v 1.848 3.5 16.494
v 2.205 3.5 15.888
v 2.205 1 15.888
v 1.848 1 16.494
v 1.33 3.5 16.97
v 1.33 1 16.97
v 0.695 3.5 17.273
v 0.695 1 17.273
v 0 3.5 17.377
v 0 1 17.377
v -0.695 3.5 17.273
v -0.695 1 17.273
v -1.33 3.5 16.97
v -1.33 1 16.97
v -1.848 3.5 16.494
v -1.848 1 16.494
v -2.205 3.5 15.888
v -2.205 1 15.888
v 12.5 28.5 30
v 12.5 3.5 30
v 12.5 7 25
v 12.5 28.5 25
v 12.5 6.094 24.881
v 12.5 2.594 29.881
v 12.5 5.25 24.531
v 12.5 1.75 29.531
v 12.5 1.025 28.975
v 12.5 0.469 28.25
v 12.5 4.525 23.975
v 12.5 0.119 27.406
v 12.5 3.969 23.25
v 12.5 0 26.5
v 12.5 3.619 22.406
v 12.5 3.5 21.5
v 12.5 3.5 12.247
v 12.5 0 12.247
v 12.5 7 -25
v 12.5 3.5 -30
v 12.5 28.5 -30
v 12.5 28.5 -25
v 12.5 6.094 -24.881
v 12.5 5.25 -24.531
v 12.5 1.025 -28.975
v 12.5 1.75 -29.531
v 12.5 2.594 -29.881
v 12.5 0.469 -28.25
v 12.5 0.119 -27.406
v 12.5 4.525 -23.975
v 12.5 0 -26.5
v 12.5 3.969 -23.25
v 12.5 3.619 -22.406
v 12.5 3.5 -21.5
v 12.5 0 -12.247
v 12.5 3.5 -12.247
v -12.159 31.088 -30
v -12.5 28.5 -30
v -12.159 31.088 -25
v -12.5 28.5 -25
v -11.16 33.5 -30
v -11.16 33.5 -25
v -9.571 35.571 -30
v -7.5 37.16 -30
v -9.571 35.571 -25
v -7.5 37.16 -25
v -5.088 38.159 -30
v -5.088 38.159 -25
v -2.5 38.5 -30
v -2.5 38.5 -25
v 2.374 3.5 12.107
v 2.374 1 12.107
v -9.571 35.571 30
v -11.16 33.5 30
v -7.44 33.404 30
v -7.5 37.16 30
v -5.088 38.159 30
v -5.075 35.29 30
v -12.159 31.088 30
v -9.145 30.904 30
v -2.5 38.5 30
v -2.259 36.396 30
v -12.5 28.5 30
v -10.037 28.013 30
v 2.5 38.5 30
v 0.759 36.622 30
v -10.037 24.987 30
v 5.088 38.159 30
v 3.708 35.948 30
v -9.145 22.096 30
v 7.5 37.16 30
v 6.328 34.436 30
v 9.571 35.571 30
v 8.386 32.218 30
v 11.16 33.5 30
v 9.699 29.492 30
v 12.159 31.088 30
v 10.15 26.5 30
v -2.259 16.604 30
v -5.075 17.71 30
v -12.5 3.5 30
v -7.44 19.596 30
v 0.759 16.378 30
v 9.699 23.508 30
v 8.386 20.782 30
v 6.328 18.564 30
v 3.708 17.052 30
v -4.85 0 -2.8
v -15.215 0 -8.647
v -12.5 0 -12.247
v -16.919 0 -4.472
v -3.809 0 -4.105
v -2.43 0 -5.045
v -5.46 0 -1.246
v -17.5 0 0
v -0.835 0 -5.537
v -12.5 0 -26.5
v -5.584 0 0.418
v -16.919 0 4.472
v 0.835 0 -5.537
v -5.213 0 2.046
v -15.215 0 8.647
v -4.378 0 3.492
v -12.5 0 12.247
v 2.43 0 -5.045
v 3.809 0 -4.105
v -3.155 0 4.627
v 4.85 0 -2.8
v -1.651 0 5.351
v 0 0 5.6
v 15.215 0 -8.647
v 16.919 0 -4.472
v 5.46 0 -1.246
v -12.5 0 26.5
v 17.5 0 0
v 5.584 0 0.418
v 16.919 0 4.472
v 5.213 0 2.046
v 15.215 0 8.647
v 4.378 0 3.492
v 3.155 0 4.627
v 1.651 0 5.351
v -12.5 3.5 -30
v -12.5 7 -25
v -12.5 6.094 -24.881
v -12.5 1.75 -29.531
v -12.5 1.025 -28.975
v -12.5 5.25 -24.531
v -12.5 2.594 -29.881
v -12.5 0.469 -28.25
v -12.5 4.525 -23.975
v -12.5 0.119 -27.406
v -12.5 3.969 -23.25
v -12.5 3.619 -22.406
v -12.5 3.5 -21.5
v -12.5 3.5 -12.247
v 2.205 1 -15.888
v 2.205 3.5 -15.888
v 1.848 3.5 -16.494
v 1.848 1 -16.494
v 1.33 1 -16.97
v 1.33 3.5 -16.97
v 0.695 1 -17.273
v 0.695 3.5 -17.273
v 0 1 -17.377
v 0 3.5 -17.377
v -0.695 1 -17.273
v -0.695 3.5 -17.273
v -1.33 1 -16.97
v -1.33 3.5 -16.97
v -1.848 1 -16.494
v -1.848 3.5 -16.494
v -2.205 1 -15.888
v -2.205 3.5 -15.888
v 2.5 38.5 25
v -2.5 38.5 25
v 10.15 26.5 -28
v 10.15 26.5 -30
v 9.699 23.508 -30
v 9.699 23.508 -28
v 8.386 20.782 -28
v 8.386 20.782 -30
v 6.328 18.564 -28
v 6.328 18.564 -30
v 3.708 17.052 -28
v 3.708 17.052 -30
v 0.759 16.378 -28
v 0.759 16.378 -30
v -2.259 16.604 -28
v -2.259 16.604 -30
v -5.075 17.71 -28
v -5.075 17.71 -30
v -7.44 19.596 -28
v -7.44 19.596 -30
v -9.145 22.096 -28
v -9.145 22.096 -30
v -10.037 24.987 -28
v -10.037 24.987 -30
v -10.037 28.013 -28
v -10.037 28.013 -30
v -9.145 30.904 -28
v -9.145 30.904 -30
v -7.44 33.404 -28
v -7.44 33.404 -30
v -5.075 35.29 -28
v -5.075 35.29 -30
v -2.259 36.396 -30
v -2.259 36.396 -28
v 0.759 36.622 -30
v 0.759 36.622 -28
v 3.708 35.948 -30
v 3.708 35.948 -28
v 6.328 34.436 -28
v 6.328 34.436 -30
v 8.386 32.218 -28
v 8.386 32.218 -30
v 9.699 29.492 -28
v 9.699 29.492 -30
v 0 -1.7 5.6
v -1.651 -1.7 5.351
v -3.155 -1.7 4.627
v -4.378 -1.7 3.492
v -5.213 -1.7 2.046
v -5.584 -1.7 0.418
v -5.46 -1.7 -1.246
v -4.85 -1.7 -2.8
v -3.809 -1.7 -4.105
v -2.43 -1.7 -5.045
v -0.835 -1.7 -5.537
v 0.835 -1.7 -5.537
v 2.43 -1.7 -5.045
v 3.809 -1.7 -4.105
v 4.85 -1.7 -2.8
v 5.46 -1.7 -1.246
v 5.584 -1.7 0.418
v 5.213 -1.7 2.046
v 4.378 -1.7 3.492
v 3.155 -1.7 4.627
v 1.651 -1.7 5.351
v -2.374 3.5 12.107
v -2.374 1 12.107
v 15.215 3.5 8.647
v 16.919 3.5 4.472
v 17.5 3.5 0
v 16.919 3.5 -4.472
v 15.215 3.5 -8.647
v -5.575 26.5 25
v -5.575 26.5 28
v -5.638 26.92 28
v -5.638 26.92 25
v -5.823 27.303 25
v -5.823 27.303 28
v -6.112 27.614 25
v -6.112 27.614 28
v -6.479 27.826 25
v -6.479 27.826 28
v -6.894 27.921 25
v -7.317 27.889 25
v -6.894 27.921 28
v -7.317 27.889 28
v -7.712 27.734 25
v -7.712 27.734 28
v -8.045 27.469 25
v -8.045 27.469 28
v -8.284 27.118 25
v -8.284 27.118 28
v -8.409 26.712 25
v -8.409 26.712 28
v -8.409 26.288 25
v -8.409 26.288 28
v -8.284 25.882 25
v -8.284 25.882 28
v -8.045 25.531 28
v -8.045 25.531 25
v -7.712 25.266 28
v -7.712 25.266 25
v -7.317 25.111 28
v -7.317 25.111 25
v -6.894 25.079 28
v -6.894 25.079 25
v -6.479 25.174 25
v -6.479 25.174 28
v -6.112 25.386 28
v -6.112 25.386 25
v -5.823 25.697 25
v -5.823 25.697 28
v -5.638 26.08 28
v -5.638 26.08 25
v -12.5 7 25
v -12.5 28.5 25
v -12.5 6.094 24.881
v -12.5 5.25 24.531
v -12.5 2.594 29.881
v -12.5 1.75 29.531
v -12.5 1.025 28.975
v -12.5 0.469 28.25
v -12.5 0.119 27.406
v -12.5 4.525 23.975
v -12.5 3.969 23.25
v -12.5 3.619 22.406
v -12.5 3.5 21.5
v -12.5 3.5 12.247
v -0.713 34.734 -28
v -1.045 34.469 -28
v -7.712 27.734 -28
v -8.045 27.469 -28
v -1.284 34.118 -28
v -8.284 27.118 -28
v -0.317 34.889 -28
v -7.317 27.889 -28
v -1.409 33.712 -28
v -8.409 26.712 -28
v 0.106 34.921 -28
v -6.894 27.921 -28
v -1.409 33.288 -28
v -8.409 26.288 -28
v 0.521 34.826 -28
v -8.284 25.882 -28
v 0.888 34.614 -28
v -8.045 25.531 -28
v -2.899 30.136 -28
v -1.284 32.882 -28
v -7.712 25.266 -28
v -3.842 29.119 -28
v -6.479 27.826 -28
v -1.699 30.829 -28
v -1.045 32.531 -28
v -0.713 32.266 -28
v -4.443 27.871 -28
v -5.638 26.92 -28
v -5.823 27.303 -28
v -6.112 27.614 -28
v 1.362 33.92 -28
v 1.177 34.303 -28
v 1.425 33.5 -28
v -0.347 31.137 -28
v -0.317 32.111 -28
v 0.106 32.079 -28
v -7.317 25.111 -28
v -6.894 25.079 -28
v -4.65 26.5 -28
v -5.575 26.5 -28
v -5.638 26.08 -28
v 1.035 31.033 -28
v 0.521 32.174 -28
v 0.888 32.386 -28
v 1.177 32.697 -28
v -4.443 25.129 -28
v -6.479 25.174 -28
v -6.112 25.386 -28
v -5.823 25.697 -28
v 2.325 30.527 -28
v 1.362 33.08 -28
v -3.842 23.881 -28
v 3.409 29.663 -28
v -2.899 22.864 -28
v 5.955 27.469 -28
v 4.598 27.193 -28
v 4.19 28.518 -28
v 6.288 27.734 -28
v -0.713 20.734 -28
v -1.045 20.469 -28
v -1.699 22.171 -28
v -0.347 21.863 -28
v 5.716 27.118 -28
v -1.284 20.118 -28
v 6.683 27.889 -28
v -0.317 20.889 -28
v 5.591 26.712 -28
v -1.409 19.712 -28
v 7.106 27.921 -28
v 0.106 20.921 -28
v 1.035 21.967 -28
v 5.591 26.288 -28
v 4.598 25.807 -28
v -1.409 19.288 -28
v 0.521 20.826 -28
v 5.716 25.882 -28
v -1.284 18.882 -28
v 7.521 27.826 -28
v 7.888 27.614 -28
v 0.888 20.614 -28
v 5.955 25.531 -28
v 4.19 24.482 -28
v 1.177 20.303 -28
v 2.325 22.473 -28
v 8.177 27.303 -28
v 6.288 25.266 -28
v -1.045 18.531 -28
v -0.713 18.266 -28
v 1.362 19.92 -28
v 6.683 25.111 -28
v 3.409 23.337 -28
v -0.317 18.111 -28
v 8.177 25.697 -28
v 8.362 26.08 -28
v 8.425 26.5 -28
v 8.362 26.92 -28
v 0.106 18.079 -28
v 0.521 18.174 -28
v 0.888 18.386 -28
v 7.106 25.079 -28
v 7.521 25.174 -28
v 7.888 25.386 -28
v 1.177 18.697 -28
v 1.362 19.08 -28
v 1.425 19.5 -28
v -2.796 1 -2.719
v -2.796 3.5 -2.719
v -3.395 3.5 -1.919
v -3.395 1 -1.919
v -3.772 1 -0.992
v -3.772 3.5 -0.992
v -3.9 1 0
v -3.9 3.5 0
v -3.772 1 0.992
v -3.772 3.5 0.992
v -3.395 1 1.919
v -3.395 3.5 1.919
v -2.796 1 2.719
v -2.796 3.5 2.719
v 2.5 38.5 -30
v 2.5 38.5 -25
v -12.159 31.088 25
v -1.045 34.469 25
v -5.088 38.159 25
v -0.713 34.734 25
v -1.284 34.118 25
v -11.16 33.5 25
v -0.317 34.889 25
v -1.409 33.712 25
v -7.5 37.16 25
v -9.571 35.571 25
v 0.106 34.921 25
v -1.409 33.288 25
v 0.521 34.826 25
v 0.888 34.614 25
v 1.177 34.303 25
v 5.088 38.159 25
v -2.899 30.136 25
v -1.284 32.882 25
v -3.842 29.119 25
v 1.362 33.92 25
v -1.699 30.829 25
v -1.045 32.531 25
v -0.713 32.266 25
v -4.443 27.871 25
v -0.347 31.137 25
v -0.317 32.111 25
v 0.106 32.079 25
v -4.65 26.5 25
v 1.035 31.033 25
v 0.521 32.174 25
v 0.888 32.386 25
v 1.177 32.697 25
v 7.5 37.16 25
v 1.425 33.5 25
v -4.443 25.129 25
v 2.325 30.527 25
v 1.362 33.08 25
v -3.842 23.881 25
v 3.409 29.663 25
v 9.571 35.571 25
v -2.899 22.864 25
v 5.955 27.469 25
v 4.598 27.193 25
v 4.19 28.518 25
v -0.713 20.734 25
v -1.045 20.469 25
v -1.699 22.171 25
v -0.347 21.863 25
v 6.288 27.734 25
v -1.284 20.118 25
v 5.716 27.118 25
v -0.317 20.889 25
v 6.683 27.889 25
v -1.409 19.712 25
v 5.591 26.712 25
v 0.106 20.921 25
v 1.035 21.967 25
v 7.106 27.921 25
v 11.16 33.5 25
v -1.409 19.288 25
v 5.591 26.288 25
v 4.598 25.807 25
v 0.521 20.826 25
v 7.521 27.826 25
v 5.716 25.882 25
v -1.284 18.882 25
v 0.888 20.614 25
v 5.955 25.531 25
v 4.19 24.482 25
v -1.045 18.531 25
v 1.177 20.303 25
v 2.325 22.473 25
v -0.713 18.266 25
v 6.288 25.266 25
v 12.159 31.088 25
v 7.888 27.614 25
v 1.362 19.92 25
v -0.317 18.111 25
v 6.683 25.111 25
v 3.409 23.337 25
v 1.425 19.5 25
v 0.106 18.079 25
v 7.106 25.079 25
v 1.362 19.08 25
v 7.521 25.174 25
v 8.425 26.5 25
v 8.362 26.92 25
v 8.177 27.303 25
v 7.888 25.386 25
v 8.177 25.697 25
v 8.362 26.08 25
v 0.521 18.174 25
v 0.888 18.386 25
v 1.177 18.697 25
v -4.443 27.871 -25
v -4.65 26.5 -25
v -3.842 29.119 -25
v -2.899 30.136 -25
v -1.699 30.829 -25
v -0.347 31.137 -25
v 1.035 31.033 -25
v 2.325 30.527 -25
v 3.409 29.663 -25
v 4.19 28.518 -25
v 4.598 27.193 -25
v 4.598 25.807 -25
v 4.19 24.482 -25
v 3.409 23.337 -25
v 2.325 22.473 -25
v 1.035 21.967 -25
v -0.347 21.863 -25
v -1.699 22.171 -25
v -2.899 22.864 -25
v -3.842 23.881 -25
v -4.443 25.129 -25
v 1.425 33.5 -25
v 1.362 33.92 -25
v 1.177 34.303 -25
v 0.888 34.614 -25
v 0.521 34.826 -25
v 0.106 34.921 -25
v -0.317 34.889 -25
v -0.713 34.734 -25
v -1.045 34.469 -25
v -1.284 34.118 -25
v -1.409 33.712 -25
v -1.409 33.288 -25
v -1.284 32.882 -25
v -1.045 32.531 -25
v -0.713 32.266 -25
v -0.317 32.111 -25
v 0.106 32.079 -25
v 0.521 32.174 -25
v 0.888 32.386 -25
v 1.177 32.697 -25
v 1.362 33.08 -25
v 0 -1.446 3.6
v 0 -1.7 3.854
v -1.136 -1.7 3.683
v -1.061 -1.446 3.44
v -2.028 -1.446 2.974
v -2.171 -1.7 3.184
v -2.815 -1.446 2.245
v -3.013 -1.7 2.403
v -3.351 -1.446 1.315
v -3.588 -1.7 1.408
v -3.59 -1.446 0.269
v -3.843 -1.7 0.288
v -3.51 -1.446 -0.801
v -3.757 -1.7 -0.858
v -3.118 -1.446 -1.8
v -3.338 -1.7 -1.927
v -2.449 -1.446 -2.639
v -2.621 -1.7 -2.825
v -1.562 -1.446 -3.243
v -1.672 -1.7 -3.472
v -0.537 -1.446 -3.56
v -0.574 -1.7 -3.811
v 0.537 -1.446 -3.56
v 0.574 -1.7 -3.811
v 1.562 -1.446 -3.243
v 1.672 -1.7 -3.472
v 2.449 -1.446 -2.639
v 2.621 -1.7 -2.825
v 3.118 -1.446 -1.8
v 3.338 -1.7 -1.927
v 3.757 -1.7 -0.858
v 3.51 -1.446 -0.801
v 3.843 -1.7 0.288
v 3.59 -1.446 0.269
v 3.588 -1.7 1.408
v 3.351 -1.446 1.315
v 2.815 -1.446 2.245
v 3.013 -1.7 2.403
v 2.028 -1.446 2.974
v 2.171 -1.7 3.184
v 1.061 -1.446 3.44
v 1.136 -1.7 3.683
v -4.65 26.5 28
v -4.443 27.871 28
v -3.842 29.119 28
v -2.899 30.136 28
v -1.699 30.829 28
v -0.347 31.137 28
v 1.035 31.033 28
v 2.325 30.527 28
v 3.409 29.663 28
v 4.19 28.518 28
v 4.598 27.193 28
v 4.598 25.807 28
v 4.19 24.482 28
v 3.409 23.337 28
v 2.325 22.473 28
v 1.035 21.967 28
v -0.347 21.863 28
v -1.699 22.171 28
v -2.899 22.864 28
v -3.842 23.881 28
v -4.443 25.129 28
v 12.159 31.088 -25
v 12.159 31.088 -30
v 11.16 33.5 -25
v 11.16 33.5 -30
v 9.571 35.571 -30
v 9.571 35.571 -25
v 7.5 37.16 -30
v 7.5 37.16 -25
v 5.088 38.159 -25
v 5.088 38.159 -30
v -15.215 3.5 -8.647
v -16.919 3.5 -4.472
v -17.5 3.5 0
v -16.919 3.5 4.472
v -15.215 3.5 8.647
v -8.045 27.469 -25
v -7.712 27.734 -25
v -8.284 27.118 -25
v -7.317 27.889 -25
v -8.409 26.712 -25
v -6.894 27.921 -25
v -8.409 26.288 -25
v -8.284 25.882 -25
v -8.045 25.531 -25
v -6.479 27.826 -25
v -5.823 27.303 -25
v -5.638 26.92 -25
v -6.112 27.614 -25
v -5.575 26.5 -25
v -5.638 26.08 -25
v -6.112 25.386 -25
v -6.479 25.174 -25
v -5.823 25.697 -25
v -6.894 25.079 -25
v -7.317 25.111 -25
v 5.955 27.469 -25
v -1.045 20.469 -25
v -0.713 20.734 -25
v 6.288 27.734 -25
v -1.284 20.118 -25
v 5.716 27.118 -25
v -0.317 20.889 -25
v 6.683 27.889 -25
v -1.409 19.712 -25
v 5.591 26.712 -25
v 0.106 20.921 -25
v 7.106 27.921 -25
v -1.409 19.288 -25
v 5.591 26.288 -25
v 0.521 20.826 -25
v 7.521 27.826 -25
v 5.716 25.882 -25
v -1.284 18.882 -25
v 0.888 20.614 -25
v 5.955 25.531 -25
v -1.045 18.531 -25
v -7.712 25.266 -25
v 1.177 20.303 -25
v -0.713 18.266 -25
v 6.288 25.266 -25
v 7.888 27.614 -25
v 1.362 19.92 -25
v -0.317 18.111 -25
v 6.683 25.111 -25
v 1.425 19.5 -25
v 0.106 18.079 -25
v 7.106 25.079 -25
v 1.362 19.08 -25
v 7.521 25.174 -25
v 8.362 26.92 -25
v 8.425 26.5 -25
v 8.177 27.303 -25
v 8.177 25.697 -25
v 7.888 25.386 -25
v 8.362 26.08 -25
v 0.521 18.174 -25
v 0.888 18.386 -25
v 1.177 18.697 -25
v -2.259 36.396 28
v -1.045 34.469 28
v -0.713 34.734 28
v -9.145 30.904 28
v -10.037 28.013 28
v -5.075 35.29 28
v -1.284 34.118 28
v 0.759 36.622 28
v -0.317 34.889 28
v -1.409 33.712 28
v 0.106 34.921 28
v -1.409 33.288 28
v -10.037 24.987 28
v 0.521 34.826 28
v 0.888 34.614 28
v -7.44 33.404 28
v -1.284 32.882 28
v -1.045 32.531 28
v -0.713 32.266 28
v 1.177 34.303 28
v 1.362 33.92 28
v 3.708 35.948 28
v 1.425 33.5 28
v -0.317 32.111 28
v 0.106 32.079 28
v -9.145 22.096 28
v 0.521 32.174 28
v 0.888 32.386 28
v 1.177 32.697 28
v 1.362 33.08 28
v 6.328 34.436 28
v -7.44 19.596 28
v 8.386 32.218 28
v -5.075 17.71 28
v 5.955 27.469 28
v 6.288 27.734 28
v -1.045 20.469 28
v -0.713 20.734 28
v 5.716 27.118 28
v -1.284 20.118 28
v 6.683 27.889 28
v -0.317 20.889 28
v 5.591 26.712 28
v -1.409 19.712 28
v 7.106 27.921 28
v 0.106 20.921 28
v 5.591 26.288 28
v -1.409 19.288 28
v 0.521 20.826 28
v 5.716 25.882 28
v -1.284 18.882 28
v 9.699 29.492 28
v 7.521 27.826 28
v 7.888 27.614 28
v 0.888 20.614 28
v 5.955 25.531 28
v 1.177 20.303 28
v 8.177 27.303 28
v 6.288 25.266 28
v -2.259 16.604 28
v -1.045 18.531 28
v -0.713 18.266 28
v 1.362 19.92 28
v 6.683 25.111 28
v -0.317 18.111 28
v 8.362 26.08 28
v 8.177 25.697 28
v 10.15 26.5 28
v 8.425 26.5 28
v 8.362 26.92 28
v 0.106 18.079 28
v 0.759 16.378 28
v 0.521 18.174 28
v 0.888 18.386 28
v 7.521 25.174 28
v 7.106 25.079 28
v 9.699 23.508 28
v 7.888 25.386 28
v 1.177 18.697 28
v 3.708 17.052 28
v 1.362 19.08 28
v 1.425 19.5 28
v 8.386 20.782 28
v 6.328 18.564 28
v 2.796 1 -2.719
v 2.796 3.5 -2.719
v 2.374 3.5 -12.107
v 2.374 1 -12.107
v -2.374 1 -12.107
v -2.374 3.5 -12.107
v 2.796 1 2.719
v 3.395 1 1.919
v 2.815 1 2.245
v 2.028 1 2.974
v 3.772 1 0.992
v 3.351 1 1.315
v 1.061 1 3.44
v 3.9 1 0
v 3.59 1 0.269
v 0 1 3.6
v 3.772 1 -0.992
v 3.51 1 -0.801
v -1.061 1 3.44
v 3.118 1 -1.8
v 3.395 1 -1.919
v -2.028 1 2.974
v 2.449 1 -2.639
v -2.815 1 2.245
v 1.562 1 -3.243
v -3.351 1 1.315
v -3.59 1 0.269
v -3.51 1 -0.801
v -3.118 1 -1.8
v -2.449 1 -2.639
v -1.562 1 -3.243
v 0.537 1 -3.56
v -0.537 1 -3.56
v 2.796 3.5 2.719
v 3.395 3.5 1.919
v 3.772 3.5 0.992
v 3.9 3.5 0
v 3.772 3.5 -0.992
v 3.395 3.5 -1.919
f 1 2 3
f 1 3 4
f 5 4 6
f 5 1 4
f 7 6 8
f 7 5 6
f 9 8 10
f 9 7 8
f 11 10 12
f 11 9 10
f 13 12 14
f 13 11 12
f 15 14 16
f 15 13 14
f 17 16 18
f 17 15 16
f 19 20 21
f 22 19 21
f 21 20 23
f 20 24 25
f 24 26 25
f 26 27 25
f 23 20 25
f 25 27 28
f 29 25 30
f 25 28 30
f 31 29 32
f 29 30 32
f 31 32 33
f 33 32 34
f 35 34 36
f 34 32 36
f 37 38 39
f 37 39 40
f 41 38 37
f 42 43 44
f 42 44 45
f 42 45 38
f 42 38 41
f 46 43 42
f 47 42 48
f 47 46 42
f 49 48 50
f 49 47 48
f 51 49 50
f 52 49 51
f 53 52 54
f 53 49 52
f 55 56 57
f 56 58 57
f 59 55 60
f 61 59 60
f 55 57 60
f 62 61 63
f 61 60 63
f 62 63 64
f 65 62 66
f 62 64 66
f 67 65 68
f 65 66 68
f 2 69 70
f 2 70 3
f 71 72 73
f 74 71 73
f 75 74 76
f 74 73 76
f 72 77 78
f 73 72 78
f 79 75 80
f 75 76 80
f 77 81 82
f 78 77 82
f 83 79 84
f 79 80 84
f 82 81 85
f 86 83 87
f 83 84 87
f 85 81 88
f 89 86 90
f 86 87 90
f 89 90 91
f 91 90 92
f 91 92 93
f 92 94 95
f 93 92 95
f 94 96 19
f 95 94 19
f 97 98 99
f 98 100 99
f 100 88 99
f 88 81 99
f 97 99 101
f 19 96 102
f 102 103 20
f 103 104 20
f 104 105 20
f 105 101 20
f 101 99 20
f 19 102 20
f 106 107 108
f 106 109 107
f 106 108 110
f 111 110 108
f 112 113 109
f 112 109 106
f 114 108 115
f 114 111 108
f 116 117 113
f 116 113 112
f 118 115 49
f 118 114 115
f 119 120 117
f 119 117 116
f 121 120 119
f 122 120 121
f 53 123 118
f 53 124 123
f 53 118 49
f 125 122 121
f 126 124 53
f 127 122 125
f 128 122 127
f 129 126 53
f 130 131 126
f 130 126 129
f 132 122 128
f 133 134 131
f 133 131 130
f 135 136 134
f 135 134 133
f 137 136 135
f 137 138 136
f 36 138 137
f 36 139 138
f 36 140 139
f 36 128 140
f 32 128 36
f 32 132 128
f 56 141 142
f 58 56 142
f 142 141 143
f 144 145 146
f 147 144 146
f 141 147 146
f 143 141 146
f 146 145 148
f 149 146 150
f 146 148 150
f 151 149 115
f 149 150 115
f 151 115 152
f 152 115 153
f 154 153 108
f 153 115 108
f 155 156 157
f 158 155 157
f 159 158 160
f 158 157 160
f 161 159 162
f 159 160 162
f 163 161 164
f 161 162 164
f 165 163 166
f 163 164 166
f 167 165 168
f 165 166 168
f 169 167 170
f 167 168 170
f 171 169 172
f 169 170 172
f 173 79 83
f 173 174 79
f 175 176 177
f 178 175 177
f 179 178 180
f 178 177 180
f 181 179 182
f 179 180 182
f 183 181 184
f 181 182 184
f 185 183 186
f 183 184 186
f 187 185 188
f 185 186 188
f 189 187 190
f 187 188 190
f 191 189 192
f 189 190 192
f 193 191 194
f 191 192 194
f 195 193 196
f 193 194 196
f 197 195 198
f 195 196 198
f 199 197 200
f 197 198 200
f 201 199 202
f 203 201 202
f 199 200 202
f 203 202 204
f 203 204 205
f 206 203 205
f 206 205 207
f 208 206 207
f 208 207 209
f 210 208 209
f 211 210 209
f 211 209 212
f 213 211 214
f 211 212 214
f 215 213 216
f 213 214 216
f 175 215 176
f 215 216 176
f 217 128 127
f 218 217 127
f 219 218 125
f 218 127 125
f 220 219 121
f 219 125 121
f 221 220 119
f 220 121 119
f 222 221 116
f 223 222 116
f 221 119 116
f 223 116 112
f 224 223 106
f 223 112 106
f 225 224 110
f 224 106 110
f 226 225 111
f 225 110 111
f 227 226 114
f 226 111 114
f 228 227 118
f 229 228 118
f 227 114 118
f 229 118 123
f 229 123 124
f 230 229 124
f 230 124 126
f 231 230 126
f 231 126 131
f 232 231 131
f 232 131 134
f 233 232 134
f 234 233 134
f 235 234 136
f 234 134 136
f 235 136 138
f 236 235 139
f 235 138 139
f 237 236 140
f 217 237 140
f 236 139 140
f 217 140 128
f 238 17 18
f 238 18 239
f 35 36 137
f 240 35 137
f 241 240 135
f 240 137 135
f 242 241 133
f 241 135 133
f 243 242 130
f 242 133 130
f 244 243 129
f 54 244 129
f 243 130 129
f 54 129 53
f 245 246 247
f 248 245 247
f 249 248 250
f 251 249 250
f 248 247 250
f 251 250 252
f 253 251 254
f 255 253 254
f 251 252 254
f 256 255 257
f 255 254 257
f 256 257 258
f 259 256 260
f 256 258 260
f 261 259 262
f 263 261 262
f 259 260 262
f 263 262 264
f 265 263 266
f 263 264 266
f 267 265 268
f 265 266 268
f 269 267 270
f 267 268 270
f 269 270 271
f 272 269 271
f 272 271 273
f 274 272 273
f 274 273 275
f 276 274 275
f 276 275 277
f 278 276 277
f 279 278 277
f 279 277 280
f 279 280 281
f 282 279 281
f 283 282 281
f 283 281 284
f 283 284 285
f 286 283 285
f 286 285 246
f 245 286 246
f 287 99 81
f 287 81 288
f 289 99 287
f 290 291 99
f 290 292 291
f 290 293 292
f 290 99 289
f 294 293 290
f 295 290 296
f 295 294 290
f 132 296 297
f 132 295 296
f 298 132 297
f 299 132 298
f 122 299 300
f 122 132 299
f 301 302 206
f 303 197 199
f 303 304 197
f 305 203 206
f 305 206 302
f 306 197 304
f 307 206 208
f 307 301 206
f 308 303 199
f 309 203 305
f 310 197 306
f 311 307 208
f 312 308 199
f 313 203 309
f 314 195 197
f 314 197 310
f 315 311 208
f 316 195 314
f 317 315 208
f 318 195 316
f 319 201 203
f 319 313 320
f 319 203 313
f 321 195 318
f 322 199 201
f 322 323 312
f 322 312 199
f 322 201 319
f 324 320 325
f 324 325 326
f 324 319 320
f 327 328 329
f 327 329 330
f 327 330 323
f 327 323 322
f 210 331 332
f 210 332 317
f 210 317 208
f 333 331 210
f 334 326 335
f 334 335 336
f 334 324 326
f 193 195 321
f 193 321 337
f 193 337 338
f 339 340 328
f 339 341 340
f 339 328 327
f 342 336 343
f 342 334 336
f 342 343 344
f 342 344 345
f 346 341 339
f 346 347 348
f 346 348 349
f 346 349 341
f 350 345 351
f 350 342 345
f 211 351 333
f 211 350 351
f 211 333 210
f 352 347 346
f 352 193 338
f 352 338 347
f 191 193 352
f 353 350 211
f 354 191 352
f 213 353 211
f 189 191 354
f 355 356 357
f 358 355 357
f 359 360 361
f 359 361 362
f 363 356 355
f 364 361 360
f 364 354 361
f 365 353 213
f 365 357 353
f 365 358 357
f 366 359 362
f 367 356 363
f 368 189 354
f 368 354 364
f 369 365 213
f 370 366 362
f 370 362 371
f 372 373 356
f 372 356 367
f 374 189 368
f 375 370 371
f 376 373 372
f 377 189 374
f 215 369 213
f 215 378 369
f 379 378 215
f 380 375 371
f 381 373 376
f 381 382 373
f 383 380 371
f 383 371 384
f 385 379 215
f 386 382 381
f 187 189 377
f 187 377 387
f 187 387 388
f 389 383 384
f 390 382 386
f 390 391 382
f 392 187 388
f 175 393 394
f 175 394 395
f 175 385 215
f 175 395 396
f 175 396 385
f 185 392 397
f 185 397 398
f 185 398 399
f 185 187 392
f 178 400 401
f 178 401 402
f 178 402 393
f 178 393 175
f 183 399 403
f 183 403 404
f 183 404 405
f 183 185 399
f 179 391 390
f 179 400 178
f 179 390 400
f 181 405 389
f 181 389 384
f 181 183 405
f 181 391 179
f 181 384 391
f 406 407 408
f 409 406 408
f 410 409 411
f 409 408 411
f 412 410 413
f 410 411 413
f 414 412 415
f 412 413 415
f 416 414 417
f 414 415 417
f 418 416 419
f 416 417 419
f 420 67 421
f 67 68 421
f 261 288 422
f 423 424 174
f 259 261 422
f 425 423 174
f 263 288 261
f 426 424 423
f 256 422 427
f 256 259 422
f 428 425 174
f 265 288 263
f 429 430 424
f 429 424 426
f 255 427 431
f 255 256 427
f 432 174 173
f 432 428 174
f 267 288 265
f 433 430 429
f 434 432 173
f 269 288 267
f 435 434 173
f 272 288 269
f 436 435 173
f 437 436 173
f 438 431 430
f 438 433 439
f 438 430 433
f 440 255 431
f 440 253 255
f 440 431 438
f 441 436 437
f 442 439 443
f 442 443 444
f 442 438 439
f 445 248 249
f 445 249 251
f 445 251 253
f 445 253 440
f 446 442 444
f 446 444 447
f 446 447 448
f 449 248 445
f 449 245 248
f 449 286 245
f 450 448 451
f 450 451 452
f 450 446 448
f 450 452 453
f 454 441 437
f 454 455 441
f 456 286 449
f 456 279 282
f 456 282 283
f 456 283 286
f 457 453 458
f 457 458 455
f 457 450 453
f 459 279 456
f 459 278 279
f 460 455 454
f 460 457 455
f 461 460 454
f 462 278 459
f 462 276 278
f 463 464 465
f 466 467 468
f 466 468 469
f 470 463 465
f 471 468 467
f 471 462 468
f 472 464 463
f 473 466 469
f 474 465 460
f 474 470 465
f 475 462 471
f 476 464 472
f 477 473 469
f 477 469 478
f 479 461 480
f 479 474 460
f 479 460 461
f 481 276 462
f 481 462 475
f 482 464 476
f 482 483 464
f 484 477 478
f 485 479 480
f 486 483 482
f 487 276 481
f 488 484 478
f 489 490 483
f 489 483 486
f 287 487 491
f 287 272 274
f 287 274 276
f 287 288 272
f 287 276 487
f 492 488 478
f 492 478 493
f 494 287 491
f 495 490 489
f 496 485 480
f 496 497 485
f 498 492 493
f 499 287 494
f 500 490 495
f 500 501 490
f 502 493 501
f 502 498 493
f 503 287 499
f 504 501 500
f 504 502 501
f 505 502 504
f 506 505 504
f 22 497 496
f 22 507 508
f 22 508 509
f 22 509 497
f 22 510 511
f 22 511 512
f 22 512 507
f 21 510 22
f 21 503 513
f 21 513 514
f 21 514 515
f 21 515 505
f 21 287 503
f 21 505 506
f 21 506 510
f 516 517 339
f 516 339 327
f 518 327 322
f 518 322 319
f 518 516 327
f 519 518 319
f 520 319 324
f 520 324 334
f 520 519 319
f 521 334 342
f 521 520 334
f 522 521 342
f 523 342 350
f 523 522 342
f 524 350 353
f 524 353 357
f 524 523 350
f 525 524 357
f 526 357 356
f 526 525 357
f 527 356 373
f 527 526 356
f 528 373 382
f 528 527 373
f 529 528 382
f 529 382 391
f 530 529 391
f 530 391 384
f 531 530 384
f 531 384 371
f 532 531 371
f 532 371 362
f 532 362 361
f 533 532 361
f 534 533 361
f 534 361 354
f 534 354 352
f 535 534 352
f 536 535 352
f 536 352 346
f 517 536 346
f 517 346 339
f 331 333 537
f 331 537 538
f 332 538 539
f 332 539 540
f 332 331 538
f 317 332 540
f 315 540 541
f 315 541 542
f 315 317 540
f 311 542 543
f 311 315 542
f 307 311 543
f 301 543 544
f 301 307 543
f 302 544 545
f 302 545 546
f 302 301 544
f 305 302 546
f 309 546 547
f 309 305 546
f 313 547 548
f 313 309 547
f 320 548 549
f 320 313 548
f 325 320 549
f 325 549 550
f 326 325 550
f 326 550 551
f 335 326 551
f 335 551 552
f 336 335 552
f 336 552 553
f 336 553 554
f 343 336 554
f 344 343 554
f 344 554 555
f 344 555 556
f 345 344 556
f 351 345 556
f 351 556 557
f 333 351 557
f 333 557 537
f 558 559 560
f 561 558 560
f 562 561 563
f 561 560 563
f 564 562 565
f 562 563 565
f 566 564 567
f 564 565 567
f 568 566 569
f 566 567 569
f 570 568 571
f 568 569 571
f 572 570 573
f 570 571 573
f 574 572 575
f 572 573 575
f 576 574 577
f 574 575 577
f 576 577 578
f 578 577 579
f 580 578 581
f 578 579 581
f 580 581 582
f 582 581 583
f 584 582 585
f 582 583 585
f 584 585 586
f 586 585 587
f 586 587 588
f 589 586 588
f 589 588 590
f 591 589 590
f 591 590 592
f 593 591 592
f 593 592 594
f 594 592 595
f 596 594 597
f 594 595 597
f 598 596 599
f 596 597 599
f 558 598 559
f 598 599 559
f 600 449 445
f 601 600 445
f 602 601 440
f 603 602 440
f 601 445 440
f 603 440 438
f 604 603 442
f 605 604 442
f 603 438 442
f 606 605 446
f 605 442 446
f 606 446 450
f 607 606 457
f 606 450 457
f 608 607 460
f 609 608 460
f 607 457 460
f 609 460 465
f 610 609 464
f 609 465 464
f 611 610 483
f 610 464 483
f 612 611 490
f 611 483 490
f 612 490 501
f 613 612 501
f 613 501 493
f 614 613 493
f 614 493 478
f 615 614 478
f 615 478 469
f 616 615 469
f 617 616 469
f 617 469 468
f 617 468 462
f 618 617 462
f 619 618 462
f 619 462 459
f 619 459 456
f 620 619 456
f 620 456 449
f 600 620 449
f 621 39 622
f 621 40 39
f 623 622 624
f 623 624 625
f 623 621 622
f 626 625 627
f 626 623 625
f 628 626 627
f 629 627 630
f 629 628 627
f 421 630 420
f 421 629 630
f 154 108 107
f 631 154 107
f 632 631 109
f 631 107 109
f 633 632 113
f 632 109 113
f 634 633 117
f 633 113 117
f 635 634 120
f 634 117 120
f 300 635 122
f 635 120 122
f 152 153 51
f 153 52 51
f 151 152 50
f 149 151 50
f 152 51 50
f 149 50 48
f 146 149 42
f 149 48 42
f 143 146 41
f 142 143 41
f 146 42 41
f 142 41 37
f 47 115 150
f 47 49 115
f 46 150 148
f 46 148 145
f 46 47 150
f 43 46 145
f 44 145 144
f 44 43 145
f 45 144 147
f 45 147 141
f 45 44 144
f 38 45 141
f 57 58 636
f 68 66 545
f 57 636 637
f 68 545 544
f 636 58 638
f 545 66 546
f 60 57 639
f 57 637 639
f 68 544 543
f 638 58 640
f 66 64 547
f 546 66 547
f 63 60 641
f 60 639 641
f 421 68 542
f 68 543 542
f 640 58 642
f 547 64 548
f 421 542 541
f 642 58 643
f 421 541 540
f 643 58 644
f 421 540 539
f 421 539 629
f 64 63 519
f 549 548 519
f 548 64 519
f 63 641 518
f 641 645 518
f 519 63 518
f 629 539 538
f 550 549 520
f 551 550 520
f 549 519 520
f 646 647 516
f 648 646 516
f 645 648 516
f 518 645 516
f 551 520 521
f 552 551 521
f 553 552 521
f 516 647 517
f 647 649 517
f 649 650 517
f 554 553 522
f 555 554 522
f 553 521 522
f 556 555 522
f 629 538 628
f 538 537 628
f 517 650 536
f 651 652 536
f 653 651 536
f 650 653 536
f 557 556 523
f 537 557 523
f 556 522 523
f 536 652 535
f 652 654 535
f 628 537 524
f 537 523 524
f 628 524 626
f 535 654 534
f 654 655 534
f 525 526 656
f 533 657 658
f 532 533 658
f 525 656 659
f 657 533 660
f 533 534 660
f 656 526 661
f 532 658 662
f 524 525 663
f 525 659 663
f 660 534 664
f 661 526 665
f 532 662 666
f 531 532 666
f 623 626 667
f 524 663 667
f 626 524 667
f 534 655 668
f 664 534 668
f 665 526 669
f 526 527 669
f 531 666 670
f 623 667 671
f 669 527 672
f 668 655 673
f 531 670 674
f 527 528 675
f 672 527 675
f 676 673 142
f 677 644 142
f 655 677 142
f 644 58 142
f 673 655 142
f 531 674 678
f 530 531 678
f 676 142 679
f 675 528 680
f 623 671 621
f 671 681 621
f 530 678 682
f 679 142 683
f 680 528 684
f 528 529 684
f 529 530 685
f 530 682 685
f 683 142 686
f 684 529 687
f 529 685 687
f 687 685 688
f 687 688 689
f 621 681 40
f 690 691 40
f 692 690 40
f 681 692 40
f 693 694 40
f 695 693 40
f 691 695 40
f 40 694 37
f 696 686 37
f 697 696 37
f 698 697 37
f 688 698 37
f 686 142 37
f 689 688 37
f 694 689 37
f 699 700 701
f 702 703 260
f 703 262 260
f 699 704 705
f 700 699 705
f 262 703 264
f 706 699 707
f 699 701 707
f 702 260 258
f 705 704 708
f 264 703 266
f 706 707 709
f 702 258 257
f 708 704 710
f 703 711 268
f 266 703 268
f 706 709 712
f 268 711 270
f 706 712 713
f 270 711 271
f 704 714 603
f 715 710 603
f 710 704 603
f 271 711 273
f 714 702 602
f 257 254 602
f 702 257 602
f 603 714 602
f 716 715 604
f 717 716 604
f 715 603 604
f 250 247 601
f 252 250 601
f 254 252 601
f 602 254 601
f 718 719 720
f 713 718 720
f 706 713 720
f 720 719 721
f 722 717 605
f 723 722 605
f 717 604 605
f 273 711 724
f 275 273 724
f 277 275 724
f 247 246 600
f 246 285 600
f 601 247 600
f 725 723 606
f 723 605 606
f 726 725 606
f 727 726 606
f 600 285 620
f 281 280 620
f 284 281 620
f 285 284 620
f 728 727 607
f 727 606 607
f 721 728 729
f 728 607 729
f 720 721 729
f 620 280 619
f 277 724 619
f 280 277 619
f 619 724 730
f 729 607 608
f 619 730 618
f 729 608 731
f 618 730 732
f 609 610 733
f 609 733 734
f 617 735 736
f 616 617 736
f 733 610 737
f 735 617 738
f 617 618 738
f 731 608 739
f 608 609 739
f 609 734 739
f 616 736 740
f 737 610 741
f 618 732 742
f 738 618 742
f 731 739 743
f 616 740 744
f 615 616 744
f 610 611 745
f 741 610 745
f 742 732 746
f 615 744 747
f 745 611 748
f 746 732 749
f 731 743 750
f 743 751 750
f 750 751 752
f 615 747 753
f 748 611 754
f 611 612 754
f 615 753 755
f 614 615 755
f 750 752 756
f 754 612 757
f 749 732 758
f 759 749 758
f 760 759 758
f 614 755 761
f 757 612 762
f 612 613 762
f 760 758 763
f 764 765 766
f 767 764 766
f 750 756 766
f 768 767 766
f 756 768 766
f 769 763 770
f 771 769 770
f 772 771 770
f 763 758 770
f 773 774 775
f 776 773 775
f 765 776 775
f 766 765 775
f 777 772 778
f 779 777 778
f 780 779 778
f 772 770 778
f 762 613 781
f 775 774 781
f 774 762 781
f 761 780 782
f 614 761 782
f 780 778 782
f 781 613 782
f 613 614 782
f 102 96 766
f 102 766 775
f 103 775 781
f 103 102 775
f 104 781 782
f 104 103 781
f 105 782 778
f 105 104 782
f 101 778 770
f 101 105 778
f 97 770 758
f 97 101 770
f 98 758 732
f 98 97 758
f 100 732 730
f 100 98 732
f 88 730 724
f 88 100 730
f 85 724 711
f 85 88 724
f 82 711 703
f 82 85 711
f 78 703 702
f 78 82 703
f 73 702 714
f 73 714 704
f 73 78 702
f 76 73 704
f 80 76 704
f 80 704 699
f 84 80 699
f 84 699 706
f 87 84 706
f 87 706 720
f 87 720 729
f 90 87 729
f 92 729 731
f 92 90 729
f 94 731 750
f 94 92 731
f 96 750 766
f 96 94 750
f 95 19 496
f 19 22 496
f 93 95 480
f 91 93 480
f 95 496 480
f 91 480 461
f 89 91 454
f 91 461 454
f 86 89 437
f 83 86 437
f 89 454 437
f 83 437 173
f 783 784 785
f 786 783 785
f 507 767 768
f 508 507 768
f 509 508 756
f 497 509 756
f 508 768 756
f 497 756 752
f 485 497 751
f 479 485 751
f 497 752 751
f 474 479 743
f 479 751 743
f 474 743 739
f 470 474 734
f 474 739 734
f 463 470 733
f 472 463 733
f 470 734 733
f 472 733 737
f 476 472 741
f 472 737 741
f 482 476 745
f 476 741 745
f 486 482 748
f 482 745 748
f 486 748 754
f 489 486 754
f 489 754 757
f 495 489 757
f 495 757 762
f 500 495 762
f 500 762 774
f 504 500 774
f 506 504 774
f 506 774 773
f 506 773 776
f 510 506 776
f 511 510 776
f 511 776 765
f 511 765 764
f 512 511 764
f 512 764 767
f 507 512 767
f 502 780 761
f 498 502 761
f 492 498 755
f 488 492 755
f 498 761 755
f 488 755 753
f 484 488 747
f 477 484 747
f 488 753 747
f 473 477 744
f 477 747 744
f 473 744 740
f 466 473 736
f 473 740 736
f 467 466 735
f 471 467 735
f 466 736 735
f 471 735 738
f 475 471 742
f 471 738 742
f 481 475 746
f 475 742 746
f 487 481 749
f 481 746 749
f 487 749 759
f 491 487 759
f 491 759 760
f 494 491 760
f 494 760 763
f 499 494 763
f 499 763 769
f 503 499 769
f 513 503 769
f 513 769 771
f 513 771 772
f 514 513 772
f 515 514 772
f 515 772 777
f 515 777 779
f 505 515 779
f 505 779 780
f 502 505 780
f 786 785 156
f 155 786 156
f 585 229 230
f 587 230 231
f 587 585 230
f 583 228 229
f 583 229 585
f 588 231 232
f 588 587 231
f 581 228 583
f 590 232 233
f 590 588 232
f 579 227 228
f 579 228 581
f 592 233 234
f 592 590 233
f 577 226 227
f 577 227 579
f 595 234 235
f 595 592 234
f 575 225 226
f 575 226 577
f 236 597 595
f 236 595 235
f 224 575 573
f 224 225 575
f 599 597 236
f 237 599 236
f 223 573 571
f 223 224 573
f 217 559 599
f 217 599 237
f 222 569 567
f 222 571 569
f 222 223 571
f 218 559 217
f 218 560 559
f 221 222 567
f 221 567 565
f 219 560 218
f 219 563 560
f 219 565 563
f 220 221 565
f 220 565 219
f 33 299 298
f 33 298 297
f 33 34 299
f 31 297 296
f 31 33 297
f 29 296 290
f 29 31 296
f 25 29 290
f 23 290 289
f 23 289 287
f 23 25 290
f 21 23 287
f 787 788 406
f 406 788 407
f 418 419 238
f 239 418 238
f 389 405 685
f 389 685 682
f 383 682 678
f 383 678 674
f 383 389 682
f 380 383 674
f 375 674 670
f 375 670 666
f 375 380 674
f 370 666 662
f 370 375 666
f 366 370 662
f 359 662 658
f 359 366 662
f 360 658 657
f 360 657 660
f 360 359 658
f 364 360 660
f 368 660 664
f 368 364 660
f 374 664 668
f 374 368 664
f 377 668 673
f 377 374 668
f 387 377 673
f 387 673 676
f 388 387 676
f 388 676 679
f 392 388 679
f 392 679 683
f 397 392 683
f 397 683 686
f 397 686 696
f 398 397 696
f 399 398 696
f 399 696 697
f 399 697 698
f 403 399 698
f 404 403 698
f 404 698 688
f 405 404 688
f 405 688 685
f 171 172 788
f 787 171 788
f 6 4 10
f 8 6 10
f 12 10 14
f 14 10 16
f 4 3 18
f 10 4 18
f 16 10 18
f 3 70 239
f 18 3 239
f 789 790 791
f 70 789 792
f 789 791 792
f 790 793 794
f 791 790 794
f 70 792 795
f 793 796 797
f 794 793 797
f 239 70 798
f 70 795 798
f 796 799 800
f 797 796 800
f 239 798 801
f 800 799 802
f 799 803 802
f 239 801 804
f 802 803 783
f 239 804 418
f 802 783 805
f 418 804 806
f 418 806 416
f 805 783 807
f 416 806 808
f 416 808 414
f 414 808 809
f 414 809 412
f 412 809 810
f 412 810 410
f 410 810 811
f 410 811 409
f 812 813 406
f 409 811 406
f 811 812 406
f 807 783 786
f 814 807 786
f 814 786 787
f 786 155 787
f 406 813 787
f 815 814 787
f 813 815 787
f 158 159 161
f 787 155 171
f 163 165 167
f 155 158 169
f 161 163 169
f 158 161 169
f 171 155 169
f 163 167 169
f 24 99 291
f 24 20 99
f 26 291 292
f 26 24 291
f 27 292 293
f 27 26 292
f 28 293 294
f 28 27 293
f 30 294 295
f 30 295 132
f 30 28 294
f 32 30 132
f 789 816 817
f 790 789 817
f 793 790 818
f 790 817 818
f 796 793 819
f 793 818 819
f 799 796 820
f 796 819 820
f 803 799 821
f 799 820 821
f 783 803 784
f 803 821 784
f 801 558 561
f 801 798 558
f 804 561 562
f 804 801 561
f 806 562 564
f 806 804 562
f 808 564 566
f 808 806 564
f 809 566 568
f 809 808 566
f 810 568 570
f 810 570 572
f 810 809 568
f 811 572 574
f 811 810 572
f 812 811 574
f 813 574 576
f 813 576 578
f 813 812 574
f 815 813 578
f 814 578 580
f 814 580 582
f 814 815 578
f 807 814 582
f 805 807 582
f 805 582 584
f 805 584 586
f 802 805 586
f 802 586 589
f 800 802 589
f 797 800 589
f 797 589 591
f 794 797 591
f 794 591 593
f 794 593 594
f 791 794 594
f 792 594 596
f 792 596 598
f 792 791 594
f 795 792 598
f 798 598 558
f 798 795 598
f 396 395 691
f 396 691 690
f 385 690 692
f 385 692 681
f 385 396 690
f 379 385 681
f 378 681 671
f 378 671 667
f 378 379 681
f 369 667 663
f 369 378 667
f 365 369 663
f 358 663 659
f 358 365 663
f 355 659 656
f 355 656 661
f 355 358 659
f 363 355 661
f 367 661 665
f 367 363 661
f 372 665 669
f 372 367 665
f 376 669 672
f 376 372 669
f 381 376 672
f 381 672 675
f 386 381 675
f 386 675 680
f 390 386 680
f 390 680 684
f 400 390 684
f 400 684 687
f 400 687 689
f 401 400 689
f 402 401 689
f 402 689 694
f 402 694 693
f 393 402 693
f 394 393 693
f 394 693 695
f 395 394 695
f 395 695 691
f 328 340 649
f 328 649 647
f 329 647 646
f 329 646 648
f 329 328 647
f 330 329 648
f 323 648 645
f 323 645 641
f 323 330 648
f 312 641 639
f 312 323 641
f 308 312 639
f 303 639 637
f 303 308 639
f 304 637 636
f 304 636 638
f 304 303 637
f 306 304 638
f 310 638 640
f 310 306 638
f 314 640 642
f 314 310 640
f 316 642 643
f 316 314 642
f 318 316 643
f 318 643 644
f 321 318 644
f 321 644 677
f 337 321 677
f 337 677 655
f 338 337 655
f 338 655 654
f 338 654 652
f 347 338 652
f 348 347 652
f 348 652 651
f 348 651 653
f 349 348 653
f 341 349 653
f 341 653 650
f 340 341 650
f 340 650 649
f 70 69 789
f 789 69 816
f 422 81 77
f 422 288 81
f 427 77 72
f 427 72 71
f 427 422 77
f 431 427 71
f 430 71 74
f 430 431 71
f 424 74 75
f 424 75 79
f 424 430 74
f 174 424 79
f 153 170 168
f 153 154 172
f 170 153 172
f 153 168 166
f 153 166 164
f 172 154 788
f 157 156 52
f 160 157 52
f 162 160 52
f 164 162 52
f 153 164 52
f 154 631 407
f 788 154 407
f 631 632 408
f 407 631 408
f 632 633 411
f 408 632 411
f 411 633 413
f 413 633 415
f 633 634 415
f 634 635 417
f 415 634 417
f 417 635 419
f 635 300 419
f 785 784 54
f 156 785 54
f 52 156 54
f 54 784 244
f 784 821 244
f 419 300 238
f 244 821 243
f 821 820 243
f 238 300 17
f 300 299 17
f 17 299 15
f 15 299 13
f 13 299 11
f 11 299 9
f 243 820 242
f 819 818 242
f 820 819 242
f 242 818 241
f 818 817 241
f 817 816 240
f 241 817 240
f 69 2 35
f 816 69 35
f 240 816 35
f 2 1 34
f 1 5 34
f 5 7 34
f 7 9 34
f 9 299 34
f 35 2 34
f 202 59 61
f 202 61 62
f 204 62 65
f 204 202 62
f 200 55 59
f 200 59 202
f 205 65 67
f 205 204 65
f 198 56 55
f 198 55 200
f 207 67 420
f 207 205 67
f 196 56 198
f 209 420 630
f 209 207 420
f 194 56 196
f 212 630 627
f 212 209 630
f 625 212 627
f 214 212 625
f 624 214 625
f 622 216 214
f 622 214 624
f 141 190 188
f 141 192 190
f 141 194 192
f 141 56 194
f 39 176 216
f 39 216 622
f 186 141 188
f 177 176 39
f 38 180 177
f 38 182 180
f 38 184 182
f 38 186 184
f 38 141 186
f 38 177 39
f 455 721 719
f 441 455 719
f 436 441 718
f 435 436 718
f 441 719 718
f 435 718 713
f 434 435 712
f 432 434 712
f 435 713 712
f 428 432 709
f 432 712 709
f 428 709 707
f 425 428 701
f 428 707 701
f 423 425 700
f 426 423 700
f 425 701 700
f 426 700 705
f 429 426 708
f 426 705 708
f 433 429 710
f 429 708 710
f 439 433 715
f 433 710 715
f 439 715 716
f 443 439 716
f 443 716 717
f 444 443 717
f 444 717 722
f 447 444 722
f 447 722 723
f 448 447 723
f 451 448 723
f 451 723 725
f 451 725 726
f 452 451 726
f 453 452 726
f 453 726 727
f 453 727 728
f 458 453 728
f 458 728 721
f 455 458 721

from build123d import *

# Parameters (mm, degrees)
CROQUIS1_R                   = 17.5
CROQUIS1_R_2                 = 1.65
SALIENTE_EXTRUIR1_DEPTH      = 3.5
CORTAR_EXTRUIR1_DEPTH        = 2.5
CROQUIS4_R                   = 3.6
CORTAR_EXTRUIR2_DEPTH        = 25.874685928
CORTAR_EXTRUIR2_DEPTH_BACK   = 25.874685928
CROQUIS5_R                   = 5.6
CROQUIS5_R_2                 = 3.6
SALIENTE_EXTRUIR2_DEPTH      = 1.7
SALIENTE_EXTRUIR3_REACH      = 52.742
SALIENTE_EXTRUIR3_END_RADIUS = 17.5
CROQUIS6_W                   = 25
CROQUIS6_H                   = 3.5
CROQUIS7_W                   = 25
CROQUIS7_H                   = 5
SALIENTE_EXTRUIR4_DEPTH      = 35
REDONDEO1_R                  = 3.5
REDONDEO1_OF_SIMETR_A1_R     = 3.5
CHAFL_N1_SIZE                = 0.254
CORTAR_EXTRUIR3_DEPTH        = 2.5
CROQUIS10_R                  = 10.15
CROQUIS10_R_2                = 1.425
CROQUIS10_R_3                = 1
CORTAR_EXTRUIR7_DEPTH        = 2
CORTAR_EXTRUIR8_REACH        = 71.379
CROQUIS11_R                  = 4.65
CORTAR_EXTRUIR9_REACH        = 73.781
CROQUIS13_R                  = 1.425
REDONDEO2_R                  = 10
CORTAR_EXTRUIR10_DEPTH       = 2.5


with BuildPart() as part:
    # Croquis1 → Saliente-Extruir1 (new body)
    with BuildSketch(Plane(origin=(0, 0, 0), x_dir=(1, 0, 0), z_dir=(0, 1, 0))):
        with Locations(Location((0, 0, 0), (0, 0, 270))):
            Circle(CROQUIS1_R)
        with Locations(Location((0, 0, 0), (0, 0, 270))):
            Circle(CROQUIS1_R_2, mode=Mode.SUBTRACT)
        with BuildLine():
            Line((-1.997159934, -12.106546701), (-2.53, -2.118749631))
            ThreePointArc((-2.53, -2.118749631), (-3.3, 0), (-2.53, 2.118749631))
            Line((-2.53, 2.118749631), (-1.997159934, 12.106546701))
            ThreePointArc((-1.997159934, 12.106546701), (0, 14), (1.997159934, 12.106546701))
            Line((1.997159934, 12.106546701), (2.53, 2.118749631))
            ThreePointArc((2.53, 2.118749631), (3.3, 0), (2.53, -2.118749631))
            Line((2.53, -2.118749631), (1.997159934, -12.106546701))
            ThreePointArc((1.997159934, -12.106546701), (0, -14), (-1.997159934, -12.106546701))
        make_face()
        with Locations(Location((0, 0, 0), (0, 0, 270))):
            Circle(CROQUIS1_R_2, mode=Mode.SUBTRACT)
    extrude(amount=SALIENTE_EXTRUIR1_DEPTH)

    # Croquis2 → Cortar-Extruir1 (cut)
    with BuildSketch(Plane(origin=(0, 3.5, 0), x_dir=(1, 0, 0), z_dir=(0, 1, 0))):
        with BuildLine():
            Line((-1.997159934, -12.106546701), (-2.53, -2.118749631))
            ThreePointArc((-2.53, -2.118749631), (-3.3, 0), (-2.53, 2.118749631))
            Line((-2.53, 2.118749631), (-1.997159934, 12.106546701))
            ThreePointArc((-1.997159934, 12.106546701), (0, 14), (1.997159934, 12.106546701))
            Line((1.997159934, 12.106546701), (2.53, 2.118749631))
            ThreePointArc((2.53, 2.118749631), (3.3, 0), (2.53, -2.118749631))
            Line((2.53, -2.118749631), (1.997159934, -12.106546701))
            ThreePointArc((1.997159934, -12.106546701), (0, -14), (-1.997159934, -12.106546701))
        make_face()
    extrude(amount=-CORTAR_EXTRUIR1_DEPTH, mode=Mode.SUBTRACT)

    # Croquis4 → Cortar-Extruir2 (cut, two sides)
    with BuildSketch(Plane(origin=(0, 1, 0), x_dir=(1, 0, 0), z_dir=(0, 1, 0))) as cortar_extruir2_sk:
        with Locations(Location((0, 0, 0), (0, 0, 270))):
            Circle(CROQUIS4_R)
    extrude(amount=CORTAR_EXTRUIR2_DEPTH, mode=Mode.SUBTRACT)
    extrude(cortar_extruir2_sk.sketch, amount=-CORTAR_EXTRUIR2_DEPTH_BACK, mode=Mode.SUBTRACT)

    # Croquis5 → Saliente-Extruir2 (add)
    with BuildSketch(Plane.XZ):
        with Locations(Location((0, 0, 0), (0, 0, 90))):
            Circle(CROQUIS5_R)
        with Locations(Location((0, 0, 0), (0, 0, 90))):
            Circle(CROQUIS5_R_2, mode=Mode.SUBTRACT)
    extrude(amount=SALIENTE_EXTRUIR2_DEPTH)

    # Saliente-Extruir3: up to this cylinder (the profile starts outside it)
    saliente_extruir3_end = Plane(origin=(0, 1.75, 0), z_dir=(0, -1, 0)) * Cylinder(SALIENTE_EXTRUIR3_END_RADIUS, 141.484, mode=Mode.PRIVATE)
    # Croquis6 → Saliente-Extruir3 (add, up to the surface)
    with BuildSketch(Plane.XY.offset(30), mode=Mode.PRIVATE) as saliente_extruir3_sk1:
        with Locations((0, 1.75)):
            Rectangle(CROQUIS6_W, CROQUIS6_H)
    saliente_extruir3_tool1 = extrude(saliente_extruir3_sk1.sketch, amount=-SALIENTE_EXTRUIR3_REACH, mode=Mode.PRIVATE) - saliente_extruir3_end
    saliente_extruir3 = saliente_extruir3_tool1.solids().sort_by_distance((0, 1.75, 30))[0]
    add(saliente_extruir3)

    # Croquis7 → Saliente-Extruir4 (add)
    with BuildSketch(Plane(origin=(0, 3.5, 0), x_dir=(1, 0, 0), z_dir=(0, 1, 0))):
        with Locations((0, -27.5)):
            Rectangle(CROQUIS7_W, CROQUIS7_H)
    saliente_extruir4 = extrude(amount=SALIENTE_EXTRUIR4_DEPTH)

    # Redondeo1
    redondeo1_edges = [part.edges().sort_by_distance(p)[0] for p in [
        (0, 0, 30),
        (0, 3.5, 25),
    ]]
    fillet(redondeo1_edges, radius=REDONDEO1_R)

    # Simetría1: Saliente-Extruir3, Saliente-Extruir4 across plane
    add(saliente_extruir3.mirror(Plane.XY))
    add(saliente_extruir4.mirror(Plane.XY))

    # Redondeo1 of Simetría1
    redondeo1_of_simetr_a1_edges = [part.edges().sort_by_distance(p)[0] for p in [
        (0, 0, -30),
        (0, 3.5, -25),
    ]]
    fillet(redondeo1_of_simetr_a1_edges, radius=REDONDEO1_OF_SIMETR_A1_R)

    # Chaflán1
    chafl_n1_edges = [part.edges().sort_by_distance(p)[0] for p in [
        (0, -1.7, -3.6),
    ]]
    chamfer(chafl_n1_edges, length=CHAFL_N1_SIZE)

    # Croquis8 → Cortar-Extruir3 (cut)
    with BuildSketch(Plane(origin=(0, 3.5, 0), x_dir=(1, 0, 0), z_dir=(0, 1, 0))):
        with BuildLine():
            Line((-2.795512377, -2.719395254), (-2.374256235, -12.106546701))
            ThreePointArc((-2.374256235, -12.106546701), (0, -14.376645718), (2.374256235, -12.106546701))
            Line((2.374256235, -12.106546701), (2.795512377, -2.719395254))
            ThreePointArc((2.795512377, -2.719395254), (3.9, 0), (2.795512377, 2.719395254))
            Line((2.795512377, 2.719395254), (2.374256235, 12.106546701))
            ThreePointArc((2.374256235, 12.106546701), (0, 14.376645718), (-2.374256235, 12.106546701))
            Line((-2.374256235, 12.106546701), (-2.795512377, 2.719395254))
            ThreePointArc((-2.795512377, 2.719395254), (-3.9, 0), (-2.795512377, -2.719395254))
        make_face()
    extrude(amount=-CORTAR_EXTRUIR3_DEPTH, mode=Mode.SUBTRACT)

    # Croquis10 → Cortar-Extruir7 (cut)
    with BuildSketch(Plane(origin=(0, 0, 30), x_dir=(-1, 0, 0), z_dir=(0, 0, -1))):
        with Locations(Location((0, 26.5, 0), (0, 0, 180))):
            Circle(CROQUIS10_R)
        with Locations((-7, 26.5)):
            Circle(CROQUIS10_R_2, mode=Mode.SUBTRACT)
        with Locations((0, 33.5)):
            Circle(CROQUIS10_R_2, mode=Mode.SUBTRACT)
        with Locations((0, 26.5)):
            Circle(CROQUIS10_R_3, mode=Mode.SUBTRACT)
        with Locations((7, 26.5)):
            Circle(CROQUIS10_R_2, mode=Mode.SUBTRACT)
        with Locations((0, 19.5)):
            Circle(CROQUIS10_R_2, mode=Mode.SUBTRACT)
        with Locations((7, 26.5)):
            Circle(CROQUIS10_R_2)
        with Locations((0, 26.5)):
            Circle(CROQUIS10_R_3)
        with Locations((0, 33.5)):
            Circle(CROQUIS10_R_2)
        with Locations((-7, 26.5)):
            Circle(CROQUIS10_R_2)
        with Locations((0, 19.5)):
            Circle(CROQUIS10_R_2)
    cortar_extruir7 = extrude(amount=CORTAR_EXTRUIR7_DEPTH, mode=Mode.SUBTRACT)

    # Croquis11 → Cortar-Extruir8 (cut, up to next)
    with BuildSketch(Plane(origin=(0, 0, 25), x_dir=(-1, 0, 0), z_dir=(0, 0, -1)), mode=Mode.PRIVATE) as cortar_extruir8_sk1:
        with Locations((0, 26.5)):
            Circle(CROQUIS11_R)
    cortar_extruir8_tool1 = extrude(cortar_extruir8_sk1.sketch, amount=-CORTAR_EXTRUIR8_REACH, mode=Mode.PRIVATE) & part.part
    cortar_extruir8 = cortar_extruir8_tool1.solids().sort_by_distance((0, 26.5, 25))[0]
    add(cortar_extruir8, mode=Mode.SUBTRACT)

    # Croquis13 → Cortar-Extruir9 (cut, up to next)
    with BuildSketch(Plane.XY.offset(28), mode=Mode.PRIVATE) as cortar_extruir9_sk1:
        with Locations((0, 19.5)):
            Circle(CROQUIS13_R)
    cortar_extruir9_tool1 = extrude(cortar_extruir9_sk1.sketch, amount=-CORTAR_EXTRUIR9_REACH, mode=Mode.PRIVATE) & part.part
    # Croquis13 → Cortar-Extruir9 (cut, up to next)
    with BuildSketch(Plane.XY.offset(28), mode=Mode.PRIVATE) as cortar_extruir9_sk2:
        with Locations((7, 26.5)):
            Circle(CROQUIS13_R)
    cortar_extruir9_tool2 = extrude(cortar_extruir9_sk2.sketch, amount=-CORTAR_EXTRUIR9_REACH, mode=Mode.PRIVATE) & part.part
    # Croquis13 → Cortar-Extruir9 (cut, up to next)
    with BuildSketch(Plane.XY.offset(28), mode=Mode.PRIVATE) as cortar_extruir9_sk3:
        with Locations((0, 33.5)):
            Circle(CROQUIS13_R)
    cortar_extruir9_tool3 = extrude(cortar_extruir9_sk3.sketch, amount=-CORTAR_EXTRUIR9_REACH, mode=Mode.PRIVATE) & part.part
    # Croquis13 → Cortar-Extruir9 (cut, up to next)
    with BuildSketch(Plane.XY.offset(28), mode=Mode.PRIVATE) as cortar_extruir9_sk4:
        with Locations((-7, 26.5)):
            Circle(CROQUIS13_R)
    cortar_extruir9_tool4 = extrude(cortar_extruir9_sk4.sketch, amount=-CORTAR_EXTRUIR9_REACH, mode=Mode.PRIVATE) & part.part
    cortar_extruir9_1 = cortar_extruir9_tool1.solids().sort_by_distance((0, 19.5, 28))[0]
    add(cortar_extruir9_1, mode=Mode.SUBTRACT)
    cortar_extruir9_2 = cortar_extruir9_tool2.solids().sort_by_distance((7, 26.5, 28))[0]
    add(cortar_extruir9_2, mode=Mode.SUBTRACT)
    cortar_extruir9_3 = cortar_extruir9_tool3.solids().sort_by_distance((0, 33.5, 28))[0]
    add(cortar_extruir9_3, mode=Mode.SUBTRACT)
    cortar_extruir9_4 = cortar_extruir9_tool4.solids().sort_by_distance((-7, 26.5, 28))[0]
    add(cortar_extruir9_4, mode=Mode.SUBTRACT)
    cortar_extruir9 = cortar_extruir9_1 + cortar_extruir9_2 + cortar_extruir9_3 + cortar_extruir9_4  # Cortar-Extruir9 as one shape, for the pattern or mirror that repeats it

    # Simetría2: Cortar-Extruir7, Cortar-Extruir8, Cortar-Extruir9 across plane
    add(cortar_extruir7.mirror(Plane.XY), mode=Mode.SUBTRACT)
    add(cortar_extruir8.mirror(Plane.XY), mode=Mode.SUBTRACT)
    add(cortar_extruir9.mirror(Plane.XY), mode=Mode.SUBTRACT)

    # Redondeo2
    redondeo2_edges = [part.edges().sort_by_distance(p)[0] for p in [
        (12.5, 38.5, -27.5),
        (-12.5, 38.5, -27.5),
        (12.5, 38.5, 27.5),
        (-12.5, 38.5, 27.5),
    ]]
    fillet(redondeo2_edges, radius=REDONDEO2_R)

    # Croquis15 → Cortar-Extruir10 (cut)
    with BuildSketch(Plane(origin=(0, 3.5, 0), x_dir=(1, 0, 0), z_dir=(0, 1, 0))):
        with BuildLine():
            Line((2.374256235, 12.106546701), (2.20456569, 15.887882306))
            ThreePointArc((2.20456569, 15.887882306), (0, 17.376645718), (-2.20456569, 15.887882306))
            Line((-2.20456569, 15.887882306), (-2.374256235, 12.106546701))
            ThreePointArc((-2.374256235, 12.106546701), (0, 14.376645718), (2.374256235, 12.106546701))
        make_face()
        with BuildLine():
            Line((2.374256235, -12.106546701), (2.20456569, -15.887882306))
            ThreePointArc((2.20456569, -15.887882306), (0, -17.376645718), (-2.20456569, -15.887882306))
            Line((-2.20456569, -15.887882306), (-2.374256235, -12.106546701))
            ThreePointArc((-2.374256235, -12.106546701), (0, -14.376645718), (2.374256235, -12.106546701))
        make_face()
    extrude(amount=-CORTAR_EXTRUIR10_DEPTH, mode=Mode.SUBTRACT)


solid = part.part
